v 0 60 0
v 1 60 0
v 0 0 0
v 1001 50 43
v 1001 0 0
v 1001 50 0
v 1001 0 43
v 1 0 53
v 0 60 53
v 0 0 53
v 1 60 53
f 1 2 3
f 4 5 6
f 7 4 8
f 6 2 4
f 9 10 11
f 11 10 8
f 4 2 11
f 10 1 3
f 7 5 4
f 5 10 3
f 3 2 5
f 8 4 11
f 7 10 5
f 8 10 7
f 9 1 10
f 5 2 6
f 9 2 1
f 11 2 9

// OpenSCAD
hull() {
rotate([90, 0, 90]) {
cube([60, 53, 1]);
translate([0, 0, 1000]) {
cube([50, 43, 1]);
}
}
}
